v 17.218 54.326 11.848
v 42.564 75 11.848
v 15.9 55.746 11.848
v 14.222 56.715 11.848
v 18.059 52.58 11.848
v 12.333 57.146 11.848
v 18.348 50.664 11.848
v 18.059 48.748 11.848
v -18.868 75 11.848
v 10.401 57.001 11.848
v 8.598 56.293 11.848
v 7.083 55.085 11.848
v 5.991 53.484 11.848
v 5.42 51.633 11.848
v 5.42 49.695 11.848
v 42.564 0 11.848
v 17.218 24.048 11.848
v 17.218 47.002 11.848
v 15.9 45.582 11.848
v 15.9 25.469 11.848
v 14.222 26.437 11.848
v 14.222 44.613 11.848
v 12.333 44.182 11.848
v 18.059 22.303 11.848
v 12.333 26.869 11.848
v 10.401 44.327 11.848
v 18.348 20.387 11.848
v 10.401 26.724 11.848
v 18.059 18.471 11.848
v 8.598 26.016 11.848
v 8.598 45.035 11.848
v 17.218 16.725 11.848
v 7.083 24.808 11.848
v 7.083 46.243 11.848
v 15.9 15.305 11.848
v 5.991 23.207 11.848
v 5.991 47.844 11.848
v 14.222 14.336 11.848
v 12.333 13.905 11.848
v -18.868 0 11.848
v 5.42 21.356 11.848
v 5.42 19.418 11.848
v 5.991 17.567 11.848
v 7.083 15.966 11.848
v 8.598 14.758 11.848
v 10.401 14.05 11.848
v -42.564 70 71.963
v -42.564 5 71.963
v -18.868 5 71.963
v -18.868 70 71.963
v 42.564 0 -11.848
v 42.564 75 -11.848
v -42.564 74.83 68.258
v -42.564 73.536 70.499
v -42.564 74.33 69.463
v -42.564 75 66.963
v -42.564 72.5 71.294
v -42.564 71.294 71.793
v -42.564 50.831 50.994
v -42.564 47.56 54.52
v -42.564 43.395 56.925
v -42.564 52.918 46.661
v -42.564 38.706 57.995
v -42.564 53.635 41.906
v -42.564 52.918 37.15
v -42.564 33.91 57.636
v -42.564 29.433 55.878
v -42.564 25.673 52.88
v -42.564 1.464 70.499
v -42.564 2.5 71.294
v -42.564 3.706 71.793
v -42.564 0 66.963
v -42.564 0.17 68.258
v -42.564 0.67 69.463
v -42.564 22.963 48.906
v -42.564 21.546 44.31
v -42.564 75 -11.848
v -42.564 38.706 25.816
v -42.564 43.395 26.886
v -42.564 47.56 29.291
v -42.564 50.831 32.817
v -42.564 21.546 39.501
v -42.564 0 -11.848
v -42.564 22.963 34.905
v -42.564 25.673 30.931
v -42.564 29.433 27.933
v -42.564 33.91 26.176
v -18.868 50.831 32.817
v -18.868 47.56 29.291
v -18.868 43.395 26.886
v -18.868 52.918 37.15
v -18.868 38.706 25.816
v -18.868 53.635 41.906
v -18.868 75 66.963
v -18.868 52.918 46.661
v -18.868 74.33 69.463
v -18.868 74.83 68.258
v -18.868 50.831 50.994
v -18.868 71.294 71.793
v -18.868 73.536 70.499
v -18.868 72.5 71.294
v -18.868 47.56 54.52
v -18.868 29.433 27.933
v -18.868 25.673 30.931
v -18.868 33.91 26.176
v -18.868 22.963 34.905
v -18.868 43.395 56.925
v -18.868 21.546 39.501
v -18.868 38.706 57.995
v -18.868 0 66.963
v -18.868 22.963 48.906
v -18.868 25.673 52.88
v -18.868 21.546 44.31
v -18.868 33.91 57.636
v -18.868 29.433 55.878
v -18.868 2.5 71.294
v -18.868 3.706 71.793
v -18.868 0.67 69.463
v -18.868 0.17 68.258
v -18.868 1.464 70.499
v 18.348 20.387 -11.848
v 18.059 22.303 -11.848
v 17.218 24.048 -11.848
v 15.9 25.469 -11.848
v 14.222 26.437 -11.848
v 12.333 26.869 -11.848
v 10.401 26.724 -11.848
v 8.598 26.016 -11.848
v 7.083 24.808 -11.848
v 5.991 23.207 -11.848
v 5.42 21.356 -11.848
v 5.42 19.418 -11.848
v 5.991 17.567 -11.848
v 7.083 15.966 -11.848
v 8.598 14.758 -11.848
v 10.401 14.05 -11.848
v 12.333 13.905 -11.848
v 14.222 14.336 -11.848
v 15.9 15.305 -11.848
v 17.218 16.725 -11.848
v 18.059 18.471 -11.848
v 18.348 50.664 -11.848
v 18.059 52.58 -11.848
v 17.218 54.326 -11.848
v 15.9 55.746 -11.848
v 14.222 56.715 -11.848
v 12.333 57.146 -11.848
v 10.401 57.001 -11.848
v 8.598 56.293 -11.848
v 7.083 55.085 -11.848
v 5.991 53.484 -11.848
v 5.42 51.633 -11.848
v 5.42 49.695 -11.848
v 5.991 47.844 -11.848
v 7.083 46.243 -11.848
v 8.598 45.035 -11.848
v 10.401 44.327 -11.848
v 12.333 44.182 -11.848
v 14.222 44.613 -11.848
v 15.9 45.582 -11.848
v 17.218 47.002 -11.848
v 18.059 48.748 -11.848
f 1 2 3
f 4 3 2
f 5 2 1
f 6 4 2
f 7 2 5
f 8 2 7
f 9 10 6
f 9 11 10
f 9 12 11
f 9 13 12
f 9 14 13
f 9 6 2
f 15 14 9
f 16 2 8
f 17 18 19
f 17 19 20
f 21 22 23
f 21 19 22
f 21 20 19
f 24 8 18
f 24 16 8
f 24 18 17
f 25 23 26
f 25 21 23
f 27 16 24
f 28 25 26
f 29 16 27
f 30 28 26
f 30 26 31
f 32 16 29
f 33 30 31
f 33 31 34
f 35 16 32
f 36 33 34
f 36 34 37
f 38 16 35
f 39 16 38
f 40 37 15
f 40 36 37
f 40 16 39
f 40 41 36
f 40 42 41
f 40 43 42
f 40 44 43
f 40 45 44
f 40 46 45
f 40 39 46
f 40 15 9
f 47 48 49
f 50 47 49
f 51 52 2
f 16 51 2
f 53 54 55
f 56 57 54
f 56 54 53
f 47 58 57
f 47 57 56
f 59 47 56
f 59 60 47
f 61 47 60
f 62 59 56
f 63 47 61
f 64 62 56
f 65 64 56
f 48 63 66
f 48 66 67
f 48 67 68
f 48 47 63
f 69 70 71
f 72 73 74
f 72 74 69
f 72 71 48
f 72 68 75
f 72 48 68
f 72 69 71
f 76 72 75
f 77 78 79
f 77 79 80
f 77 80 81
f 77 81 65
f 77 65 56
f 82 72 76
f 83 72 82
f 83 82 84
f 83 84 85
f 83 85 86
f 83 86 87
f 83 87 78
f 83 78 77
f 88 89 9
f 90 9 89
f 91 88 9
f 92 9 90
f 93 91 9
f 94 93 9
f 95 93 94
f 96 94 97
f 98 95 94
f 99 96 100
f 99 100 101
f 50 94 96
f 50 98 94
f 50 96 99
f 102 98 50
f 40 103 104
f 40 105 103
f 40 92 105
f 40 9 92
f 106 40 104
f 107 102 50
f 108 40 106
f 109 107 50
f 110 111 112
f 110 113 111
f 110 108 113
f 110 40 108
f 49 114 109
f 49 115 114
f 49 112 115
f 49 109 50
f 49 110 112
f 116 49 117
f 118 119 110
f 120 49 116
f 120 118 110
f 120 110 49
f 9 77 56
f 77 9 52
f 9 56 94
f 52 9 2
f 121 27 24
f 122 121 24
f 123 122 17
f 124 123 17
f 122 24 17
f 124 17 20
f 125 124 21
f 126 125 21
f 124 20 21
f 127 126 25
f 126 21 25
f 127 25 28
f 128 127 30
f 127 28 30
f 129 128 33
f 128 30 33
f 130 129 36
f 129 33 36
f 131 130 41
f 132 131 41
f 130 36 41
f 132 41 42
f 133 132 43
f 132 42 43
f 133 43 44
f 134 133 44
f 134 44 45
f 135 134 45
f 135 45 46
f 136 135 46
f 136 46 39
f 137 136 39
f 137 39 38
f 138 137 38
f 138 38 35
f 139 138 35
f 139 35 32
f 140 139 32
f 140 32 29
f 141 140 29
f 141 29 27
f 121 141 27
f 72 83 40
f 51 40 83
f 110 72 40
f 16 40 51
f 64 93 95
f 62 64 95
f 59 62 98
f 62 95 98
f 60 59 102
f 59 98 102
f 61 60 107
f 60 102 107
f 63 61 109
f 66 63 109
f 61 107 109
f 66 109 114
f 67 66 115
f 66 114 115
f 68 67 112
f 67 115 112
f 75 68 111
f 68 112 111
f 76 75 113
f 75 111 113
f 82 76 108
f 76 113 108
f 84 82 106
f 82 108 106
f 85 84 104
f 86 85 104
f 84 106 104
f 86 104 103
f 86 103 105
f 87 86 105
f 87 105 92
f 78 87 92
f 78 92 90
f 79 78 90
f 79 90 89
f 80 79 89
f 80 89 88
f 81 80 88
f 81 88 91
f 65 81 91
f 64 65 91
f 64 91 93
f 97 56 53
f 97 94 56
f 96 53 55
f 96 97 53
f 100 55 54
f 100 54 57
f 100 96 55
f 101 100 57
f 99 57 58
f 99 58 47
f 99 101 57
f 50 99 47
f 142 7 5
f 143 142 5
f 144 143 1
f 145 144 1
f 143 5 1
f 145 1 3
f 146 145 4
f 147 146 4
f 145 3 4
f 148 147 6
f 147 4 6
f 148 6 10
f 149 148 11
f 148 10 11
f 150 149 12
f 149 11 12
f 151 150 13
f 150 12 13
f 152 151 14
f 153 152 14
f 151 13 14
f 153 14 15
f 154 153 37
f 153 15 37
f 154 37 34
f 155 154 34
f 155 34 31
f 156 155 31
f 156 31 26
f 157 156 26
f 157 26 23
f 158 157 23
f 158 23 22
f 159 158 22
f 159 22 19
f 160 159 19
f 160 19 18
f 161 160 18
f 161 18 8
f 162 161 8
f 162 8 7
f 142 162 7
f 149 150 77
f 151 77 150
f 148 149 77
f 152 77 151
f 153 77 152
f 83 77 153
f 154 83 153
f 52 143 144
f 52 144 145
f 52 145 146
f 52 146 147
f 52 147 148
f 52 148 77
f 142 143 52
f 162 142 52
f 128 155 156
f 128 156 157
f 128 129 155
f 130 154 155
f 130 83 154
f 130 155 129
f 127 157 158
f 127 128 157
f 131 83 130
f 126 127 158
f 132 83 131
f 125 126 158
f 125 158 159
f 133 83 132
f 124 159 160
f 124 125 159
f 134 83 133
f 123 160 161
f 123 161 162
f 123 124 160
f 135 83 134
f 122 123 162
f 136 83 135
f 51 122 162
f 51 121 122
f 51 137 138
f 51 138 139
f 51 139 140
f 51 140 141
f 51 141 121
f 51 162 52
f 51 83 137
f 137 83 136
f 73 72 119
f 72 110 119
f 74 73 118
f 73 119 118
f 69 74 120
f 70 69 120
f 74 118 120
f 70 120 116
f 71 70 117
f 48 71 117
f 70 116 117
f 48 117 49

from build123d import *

# Parameters (mm, degrees)
F0_W     = 23.6952770501
F0_H     = 60.1157741621
F1_DEPTH = 75
F2_R     = 16.1345340931
F3_DEPTH = 23.6962770501
F4_R     = 6.5
F5_DEPTH = 23.6962658743
F6_R     = 5


with BuildPart() as f1:
    # F0 (on Front) → F1 (new body)
    with BuildSketch(Plane.XZ):
        Polygon((-42.5637289882, -11.8476329371), (42.5637289882, -11.8476329371), (42.5637289882, 11.8476329371), (-18.868451938, 11.8476329371), (-42.5637289882, 11.8476329371), align=None)
        with Locations((-30.7160904631, 41.9055200182)):
            Rectangle(F0_W, F0_H)
    extrude(amount=-F1_DEPTH)

    # F2 (on face) → F3 (cut, through all)
    with BuildSketch(Plane.YZ.offset(-18.868451938)):
        with Locations((37.5, 41.9055200182)):
            Circle(F2_R)
    extrude(amount=-F3_DEPTH, mode=Mode.SUBTRACT)

    # F4 (on face) → F5 (cut, through all)
    with BuildSketch(Plane.XY.offset(11.8476329371)):
        with Locations((11.8476385251, 20.3867554665)):
            Circle(F4_R)
        with Locations((11.8476385251, 50.6640449166)):
            Circle(F4_R)
    extrude(amount=-F5_DEPTH, mode=Mode.SUBTRACT)

    # F6
    f6_edges = [f1.edges().sort_by_distance(p)[0] for p in [
        (-30.71609, 0, 71.963407),
        (-30.71609, 75, 71.963407),
    ]]
    fillet(f6_edges, radius=F6_R)


solid = f1.part
